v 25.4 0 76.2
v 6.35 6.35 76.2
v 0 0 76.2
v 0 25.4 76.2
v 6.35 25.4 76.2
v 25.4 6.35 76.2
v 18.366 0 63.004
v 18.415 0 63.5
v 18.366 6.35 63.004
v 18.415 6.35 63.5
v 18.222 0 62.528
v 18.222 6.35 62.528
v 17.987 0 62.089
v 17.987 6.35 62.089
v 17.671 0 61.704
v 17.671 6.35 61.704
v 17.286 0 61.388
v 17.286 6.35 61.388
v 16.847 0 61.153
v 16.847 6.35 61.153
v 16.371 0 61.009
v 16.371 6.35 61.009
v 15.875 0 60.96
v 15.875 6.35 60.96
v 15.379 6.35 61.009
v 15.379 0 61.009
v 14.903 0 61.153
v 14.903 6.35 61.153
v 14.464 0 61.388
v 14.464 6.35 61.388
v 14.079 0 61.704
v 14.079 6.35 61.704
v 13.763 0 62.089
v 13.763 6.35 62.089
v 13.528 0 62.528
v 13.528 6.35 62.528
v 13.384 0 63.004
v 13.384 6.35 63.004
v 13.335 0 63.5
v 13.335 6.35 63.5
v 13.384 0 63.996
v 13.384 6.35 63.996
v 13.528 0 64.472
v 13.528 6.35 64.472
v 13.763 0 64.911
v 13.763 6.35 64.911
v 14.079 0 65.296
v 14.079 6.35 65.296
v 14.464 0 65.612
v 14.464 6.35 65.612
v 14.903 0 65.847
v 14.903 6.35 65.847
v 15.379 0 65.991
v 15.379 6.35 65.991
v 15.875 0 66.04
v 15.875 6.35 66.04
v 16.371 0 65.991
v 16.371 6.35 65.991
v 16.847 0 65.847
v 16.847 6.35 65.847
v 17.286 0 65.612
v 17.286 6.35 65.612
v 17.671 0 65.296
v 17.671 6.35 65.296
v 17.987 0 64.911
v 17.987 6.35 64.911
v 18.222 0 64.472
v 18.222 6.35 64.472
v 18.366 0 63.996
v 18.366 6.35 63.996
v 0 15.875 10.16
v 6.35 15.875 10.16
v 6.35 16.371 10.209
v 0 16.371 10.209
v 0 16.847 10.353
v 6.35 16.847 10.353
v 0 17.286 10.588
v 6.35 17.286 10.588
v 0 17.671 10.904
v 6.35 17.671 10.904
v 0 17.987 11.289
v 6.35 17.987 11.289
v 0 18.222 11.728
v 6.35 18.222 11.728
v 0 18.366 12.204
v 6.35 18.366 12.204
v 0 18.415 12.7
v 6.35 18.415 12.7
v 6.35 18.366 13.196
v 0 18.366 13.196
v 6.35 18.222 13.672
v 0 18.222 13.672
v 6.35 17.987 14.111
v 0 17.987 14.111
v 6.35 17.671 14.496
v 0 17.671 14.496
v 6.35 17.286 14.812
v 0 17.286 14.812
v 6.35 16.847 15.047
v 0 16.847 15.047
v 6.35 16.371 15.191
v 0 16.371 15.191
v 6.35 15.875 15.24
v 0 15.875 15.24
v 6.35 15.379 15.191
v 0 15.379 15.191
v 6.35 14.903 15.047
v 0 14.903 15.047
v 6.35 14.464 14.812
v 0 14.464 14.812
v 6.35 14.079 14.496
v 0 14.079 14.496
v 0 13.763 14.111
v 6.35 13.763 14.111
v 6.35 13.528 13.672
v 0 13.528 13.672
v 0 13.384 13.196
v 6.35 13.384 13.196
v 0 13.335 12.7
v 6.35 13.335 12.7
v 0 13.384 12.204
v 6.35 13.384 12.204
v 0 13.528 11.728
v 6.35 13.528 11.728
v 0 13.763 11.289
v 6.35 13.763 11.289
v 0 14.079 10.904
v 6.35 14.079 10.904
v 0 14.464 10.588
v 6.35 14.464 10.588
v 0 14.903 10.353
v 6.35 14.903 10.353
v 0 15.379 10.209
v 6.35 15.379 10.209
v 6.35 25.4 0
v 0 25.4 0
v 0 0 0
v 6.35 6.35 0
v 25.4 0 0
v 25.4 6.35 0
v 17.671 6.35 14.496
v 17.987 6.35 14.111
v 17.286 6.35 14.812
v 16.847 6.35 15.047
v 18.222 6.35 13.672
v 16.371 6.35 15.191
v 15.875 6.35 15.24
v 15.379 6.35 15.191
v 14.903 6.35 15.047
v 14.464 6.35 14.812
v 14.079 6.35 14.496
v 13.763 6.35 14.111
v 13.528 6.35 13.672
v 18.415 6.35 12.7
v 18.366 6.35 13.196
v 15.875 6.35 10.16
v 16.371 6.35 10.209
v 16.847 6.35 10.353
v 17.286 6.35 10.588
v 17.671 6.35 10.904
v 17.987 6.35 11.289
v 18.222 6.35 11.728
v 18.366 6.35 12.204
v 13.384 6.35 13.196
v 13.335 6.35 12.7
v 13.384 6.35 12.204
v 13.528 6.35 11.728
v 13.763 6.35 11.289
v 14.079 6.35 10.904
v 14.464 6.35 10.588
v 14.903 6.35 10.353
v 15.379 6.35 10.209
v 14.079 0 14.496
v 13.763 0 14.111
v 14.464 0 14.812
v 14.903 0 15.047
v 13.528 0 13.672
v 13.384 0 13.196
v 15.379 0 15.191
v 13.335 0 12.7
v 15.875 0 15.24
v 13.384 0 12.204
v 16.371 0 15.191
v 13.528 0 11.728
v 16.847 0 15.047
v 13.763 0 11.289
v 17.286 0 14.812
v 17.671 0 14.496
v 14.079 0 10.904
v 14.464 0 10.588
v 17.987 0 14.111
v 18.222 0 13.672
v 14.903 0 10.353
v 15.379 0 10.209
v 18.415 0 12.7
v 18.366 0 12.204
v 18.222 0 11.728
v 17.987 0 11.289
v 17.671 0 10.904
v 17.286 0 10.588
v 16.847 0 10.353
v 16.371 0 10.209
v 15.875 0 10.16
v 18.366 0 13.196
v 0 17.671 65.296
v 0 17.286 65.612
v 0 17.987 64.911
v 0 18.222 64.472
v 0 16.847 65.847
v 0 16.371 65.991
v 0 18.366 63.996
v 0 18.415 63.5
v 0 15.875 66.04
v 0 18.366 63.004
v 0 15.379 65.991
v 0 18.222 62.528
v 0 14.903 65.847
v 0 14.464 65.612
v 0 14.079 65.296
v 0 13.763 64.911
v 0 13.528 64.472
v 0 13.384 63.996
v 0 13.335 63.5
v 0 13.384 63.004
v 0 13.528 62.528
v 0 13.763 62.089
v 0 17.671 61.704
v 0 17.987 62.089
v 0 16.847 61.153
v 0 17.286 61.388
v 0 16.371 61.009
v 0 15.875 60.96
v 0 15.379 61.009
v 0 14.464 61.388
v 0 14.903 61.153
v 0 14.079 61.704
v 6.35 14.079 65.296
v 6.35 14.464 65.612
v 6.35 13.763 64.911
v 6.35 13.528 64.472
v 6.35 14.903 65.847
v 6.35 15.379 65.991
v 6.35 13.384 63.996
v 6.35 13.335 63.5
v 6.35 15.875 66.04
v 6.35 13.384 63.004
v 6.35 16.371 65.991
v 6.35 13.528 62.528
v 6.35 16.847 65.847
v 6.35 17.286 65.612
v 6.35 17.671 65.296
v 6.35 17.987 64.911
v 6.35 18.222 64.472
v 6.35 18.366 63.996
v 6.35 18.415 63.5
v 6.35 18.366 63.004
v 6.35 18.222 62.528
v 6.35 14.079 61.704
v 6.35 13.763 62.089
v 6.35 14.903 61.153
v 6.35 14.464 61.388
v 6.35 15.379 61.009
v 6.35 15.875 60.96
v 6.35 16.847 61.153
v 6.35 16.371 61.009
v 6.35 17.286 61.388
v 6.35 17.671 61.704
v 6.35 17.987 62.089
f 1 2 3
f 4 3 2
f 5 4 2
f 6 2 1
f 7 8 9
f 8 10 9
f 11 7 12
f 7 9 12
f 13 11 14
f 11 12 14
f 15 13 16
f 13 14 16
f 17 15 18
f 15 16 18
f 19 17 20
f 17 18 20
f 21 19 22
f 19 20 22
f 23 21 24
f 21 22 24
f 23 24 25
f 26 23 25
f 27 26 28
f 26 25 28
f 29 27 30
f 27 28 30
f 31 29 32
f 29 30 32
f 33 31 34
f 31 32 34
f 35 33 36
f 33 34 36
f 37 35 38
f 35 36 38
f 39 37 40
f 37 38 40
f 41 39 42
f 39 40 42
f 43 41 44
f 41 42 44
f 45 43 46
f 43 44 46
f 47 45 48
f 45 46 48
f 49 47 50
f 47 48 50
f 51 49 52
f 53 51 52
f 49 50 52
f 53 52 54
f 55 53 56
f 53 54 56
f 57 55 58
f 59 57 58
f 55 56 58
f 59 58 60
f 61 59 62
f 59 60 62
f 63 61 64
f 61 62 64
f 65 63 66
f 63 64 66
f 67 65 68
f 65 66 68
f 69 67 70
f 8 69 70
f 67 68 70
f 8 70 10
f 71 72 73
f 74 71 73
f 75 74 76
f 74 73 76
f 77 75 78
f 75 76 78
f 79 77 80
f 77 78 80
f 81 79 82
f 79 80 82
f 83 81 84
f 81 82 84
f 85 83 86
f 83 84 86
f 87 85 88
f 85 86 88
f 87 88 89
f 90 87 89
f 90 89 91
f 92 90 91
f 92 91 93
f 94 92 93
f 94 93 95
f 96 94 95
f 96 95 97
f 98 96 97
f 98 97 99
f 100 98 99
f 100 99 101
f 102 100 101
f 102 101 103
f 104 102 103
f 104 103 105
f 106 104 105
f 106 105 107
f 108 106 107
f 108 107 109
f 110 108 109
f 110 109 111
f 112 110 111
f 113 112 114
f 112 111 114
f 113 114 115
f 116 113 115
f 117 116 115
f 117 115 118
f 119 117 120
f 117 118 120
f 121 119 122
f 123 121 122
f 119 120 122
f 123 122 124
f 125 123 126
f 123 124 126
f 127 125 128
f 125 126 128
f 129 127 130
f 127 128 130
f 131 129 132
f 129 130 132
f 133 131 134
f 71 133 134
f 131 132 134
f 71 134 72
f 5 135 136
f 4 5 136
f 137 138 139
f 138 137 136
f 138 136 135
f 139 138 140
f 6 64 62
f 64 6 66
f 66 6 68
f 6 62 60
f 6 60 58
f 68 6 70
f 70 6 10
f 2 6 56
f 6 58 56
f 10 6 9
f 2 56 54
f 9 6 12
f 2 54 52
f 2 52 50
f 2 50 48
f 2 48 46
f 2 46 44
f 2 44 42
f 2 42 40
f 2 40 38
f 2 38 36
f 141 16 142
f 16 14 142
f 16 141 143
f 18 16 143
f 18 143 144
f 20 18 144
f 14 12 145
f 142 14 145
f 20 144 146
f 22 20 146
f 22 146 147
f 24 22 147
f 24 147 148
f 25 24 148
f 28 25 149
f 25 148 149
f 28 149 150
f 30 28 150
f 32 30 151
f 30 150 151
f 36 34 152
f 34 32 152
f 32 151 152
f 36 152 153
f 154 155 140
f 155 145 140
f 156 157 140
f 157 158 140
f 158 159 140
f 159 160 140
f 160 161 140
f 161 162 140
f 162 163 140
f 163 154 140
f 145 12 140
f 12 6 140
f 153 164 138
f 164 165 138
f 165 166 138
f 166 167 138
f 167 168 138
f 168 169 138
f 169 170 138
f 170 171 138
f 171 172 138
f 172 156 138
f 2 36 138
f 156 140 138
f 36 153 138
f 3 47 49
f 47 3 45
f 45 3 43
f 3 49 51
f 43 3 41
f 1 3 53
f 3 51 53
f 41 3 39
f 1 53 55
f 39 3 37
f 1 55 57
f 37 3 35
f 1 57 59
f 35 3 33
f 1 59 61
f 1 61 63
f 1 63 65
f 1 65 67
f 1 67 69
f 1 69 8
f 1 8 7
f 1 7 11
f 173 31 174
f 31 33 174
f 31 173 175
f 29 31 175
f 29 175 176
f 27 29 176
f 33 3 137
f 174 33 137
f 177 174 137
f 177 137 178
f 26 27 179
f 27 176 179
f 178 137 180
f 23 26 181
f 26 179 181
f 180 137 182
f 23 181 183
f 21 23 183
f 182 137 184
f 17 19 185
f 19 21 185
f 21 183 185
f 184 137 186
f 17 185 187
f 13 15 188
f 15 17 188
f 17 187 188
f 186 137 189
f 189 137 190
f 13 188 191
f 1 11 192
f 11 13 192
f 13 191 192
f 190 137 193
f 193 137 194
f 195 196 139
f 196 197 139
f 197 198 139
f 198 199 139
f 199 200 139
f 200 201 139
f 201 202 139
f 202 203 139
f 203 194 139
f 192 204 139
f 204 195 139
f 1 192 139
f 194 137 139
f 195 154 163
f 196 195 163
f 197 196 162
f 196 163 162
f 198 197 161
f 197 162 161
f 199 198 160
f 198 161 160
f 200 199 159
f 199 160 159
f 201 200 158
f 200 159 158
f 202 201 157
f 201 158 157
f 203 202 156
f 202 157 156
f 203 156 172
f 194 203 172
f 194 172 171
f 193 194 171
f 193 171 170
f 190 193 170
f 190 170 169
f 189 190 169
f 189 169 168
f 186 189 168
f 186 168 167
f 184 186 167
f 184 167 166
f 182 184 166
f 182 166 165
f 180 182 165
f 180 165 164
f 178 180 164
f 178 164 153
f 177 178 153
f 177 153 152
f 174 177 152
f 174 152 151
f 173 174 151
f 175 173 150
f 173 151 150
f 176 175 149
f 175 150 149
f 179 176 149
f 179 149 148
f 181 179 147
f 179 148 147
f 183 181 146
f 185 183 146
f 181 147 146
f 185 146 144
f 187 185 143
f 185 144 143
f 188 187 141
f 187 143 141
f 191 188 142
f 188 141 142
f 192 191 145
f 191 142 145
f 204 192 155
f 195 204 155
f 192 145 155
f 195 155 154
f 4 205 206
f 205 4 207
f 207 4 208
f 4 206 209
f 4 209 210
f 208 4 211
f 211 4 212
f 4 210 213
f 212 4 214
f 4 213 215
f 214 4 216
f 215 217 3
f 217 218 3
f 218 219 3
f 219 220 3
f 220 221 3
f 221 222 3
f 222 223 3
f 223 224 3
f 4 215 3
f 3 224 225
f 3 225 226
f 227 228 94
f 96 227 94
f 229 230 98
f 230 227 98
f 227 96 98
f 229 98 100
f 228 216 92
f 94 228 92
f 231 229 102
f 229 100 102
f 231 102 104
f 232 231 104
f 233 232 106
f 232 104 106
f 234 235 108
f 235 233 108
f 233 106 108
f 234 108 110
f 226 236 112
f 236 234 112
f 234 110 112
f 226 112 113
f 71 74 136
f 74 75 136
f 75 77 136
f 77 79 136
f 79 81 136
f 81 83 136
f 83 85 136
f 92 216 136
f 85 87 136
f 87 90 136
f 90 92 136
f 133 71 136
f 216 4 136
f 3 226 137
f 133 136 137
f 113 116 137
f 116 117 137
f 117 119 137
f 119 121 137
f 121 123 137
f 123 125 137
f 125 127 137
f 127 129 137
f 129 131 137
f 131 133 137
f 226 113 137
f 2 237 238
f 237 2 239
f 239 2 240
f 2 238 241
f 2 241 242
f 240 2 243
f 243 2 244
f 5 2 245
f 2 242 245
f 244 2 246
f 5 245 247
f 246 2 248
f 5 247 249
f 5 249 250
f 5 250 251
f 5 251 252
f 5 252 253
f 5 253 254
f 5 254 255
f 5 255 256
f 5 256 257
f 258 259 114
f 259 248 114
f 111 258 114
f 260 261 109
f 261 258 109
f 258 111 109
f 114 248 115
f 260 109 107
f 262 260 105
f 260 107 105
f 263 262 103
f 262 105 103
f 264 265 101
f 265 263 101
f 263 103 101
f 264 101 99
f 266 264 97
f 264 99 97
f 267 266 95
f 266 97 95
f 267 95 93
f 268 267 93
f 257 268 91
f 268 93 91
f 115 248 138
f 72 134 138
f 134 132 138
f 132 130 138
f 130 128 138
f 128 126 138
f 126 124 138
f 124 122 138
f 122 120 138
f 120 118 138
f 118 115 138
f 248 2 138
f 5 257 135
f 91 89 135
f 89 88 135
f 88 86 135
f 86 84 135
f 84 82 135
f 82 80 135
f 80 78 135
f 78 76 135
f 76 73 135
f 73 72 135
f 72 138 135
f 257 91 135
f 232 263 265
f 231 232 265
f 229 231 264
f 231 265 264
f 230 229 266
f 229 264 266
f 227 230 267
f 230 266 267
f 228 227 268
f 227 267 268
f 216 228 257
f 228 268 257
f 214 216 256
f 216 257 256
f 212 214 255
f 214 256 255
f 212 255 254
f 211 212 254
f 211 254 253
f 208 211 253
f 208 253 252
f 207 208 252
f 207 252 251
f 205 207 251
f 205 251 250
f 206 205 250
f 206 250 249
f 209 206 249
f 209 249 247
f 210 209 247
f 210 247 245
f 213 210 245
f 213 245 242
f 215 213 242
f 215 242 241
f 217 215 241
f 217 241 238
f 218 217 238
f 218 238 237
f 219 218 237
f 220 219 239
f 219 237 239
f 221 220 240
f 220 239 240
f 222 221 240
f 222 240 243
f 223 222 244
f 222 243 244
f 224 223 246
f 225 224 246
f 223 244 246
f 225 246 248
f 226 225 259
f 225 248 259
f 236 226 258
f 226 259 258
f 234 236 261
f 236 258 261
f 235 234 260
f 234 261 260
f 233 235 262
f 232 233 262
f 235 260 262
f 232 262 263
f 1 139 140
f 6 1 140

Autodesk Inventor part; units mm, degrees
ref_plane "YZ Plane" through (0, 0, 0) normal (1, 0, 0) x (0, 1, 0)
ref_plane "XZ Plane" through (0, 0, 0) normal (0, 1, 0) x (-1, 0, 0)
ref_plane "XY Plane" through (0, 0, 0) normal (0, 0, 1) x (1, 0, 0)
sketch "Sketch1" plane through (0, 0, 0) normal (0, 0, 1) x (1, 0, 0)
  line L0 (0, 0) -> (25.4, 0)
  line L1 (25.4, 0) -> (25.4, 6.35)
  line L2 (25.4, 6.35) -> (0, 6.35)
  line L3 (0, 6.35) -> (0, 0)
  line L4 (0, 0) -> (6.35, 0)
  line L5 (6.35, 0) -> (6.35, 25.4)
  line L6 (6.35, 25.4) -> (0, 25.4)
  line L7 (0, 25.4) -> (0, 0)
  dimension "d0" = 25.4
  dimension "d1" = 6.35
  dimension "d2" = 6.35
  dimension "d3" = 25.4
extrude "Extrusion1" add sketch "Sketch1" along normal blind 76.2
sketch "Sketch2" plane through (6.35, 6.35, 0) normal (0, 1, 0) x (1, 0, 0)
  line L0 (-6.35, 0) -> (19.05, 0) projected
  line L1 (19.05, 0) -> (0, 0)
  line L2 (9.525, 0) -> (9.525, -76.2)
  line L3 (-6.35, -76.2) -> (19.05, -76.2) projected
  line L4 (9.525, 0) -> (9.525, -12.7)
  line L5 (9.525, -76.2) -> (9.525, -63.5)
  circle A0 centre (9.525, -63.5) radius 2.54
  circle A1 centre (9.525, -12.7) radius 2.54
  dimension "d6" = 19.05
  dimension "d7" = 12.7
  dimension "d8" = 12.7
  dimension "d9" = 5.08
  dimension "d10" = 5.08
extrude "Extrusion2" cut sketch "Sketch2" against normal blind 25.4
sketch "Sketch3" plane through (6.35, 6.35, 0) normal (1, 0, 0) x (0, 0, -1)
  line L0 (0, 0) -> (0, 19.05) projected
  line L1 (0, 0) -> (0, 19.05)
  line L2 (0, 19.05) -> (0, 9.525)
  line L3 (0, 9.525) -> (-76.2, 9.525)
  line L4 (-76.2, 19.05) -> (-76.2, -6.35) projected
  line L5 (-76.2, 9.525) -> (-63.5, 9.525)
  line L6 (0, 9.525) -> (-12.7, 9.525)
  circle A0 centre (-63.5, 9.525) radius 2.54
  circle A1 centre (-12.7, 9.525) radius 2.54
  point P0 (0, -6.35)
  dimension "d13" = 12.7
  dimension "d14" = 12.7
  dimension "d15" = 5.08
extrude "Extrusion3" cut sketch "Sketch3" against normal blind 25.4
properties part number "Beefy L" material "Aluminum 6061"
